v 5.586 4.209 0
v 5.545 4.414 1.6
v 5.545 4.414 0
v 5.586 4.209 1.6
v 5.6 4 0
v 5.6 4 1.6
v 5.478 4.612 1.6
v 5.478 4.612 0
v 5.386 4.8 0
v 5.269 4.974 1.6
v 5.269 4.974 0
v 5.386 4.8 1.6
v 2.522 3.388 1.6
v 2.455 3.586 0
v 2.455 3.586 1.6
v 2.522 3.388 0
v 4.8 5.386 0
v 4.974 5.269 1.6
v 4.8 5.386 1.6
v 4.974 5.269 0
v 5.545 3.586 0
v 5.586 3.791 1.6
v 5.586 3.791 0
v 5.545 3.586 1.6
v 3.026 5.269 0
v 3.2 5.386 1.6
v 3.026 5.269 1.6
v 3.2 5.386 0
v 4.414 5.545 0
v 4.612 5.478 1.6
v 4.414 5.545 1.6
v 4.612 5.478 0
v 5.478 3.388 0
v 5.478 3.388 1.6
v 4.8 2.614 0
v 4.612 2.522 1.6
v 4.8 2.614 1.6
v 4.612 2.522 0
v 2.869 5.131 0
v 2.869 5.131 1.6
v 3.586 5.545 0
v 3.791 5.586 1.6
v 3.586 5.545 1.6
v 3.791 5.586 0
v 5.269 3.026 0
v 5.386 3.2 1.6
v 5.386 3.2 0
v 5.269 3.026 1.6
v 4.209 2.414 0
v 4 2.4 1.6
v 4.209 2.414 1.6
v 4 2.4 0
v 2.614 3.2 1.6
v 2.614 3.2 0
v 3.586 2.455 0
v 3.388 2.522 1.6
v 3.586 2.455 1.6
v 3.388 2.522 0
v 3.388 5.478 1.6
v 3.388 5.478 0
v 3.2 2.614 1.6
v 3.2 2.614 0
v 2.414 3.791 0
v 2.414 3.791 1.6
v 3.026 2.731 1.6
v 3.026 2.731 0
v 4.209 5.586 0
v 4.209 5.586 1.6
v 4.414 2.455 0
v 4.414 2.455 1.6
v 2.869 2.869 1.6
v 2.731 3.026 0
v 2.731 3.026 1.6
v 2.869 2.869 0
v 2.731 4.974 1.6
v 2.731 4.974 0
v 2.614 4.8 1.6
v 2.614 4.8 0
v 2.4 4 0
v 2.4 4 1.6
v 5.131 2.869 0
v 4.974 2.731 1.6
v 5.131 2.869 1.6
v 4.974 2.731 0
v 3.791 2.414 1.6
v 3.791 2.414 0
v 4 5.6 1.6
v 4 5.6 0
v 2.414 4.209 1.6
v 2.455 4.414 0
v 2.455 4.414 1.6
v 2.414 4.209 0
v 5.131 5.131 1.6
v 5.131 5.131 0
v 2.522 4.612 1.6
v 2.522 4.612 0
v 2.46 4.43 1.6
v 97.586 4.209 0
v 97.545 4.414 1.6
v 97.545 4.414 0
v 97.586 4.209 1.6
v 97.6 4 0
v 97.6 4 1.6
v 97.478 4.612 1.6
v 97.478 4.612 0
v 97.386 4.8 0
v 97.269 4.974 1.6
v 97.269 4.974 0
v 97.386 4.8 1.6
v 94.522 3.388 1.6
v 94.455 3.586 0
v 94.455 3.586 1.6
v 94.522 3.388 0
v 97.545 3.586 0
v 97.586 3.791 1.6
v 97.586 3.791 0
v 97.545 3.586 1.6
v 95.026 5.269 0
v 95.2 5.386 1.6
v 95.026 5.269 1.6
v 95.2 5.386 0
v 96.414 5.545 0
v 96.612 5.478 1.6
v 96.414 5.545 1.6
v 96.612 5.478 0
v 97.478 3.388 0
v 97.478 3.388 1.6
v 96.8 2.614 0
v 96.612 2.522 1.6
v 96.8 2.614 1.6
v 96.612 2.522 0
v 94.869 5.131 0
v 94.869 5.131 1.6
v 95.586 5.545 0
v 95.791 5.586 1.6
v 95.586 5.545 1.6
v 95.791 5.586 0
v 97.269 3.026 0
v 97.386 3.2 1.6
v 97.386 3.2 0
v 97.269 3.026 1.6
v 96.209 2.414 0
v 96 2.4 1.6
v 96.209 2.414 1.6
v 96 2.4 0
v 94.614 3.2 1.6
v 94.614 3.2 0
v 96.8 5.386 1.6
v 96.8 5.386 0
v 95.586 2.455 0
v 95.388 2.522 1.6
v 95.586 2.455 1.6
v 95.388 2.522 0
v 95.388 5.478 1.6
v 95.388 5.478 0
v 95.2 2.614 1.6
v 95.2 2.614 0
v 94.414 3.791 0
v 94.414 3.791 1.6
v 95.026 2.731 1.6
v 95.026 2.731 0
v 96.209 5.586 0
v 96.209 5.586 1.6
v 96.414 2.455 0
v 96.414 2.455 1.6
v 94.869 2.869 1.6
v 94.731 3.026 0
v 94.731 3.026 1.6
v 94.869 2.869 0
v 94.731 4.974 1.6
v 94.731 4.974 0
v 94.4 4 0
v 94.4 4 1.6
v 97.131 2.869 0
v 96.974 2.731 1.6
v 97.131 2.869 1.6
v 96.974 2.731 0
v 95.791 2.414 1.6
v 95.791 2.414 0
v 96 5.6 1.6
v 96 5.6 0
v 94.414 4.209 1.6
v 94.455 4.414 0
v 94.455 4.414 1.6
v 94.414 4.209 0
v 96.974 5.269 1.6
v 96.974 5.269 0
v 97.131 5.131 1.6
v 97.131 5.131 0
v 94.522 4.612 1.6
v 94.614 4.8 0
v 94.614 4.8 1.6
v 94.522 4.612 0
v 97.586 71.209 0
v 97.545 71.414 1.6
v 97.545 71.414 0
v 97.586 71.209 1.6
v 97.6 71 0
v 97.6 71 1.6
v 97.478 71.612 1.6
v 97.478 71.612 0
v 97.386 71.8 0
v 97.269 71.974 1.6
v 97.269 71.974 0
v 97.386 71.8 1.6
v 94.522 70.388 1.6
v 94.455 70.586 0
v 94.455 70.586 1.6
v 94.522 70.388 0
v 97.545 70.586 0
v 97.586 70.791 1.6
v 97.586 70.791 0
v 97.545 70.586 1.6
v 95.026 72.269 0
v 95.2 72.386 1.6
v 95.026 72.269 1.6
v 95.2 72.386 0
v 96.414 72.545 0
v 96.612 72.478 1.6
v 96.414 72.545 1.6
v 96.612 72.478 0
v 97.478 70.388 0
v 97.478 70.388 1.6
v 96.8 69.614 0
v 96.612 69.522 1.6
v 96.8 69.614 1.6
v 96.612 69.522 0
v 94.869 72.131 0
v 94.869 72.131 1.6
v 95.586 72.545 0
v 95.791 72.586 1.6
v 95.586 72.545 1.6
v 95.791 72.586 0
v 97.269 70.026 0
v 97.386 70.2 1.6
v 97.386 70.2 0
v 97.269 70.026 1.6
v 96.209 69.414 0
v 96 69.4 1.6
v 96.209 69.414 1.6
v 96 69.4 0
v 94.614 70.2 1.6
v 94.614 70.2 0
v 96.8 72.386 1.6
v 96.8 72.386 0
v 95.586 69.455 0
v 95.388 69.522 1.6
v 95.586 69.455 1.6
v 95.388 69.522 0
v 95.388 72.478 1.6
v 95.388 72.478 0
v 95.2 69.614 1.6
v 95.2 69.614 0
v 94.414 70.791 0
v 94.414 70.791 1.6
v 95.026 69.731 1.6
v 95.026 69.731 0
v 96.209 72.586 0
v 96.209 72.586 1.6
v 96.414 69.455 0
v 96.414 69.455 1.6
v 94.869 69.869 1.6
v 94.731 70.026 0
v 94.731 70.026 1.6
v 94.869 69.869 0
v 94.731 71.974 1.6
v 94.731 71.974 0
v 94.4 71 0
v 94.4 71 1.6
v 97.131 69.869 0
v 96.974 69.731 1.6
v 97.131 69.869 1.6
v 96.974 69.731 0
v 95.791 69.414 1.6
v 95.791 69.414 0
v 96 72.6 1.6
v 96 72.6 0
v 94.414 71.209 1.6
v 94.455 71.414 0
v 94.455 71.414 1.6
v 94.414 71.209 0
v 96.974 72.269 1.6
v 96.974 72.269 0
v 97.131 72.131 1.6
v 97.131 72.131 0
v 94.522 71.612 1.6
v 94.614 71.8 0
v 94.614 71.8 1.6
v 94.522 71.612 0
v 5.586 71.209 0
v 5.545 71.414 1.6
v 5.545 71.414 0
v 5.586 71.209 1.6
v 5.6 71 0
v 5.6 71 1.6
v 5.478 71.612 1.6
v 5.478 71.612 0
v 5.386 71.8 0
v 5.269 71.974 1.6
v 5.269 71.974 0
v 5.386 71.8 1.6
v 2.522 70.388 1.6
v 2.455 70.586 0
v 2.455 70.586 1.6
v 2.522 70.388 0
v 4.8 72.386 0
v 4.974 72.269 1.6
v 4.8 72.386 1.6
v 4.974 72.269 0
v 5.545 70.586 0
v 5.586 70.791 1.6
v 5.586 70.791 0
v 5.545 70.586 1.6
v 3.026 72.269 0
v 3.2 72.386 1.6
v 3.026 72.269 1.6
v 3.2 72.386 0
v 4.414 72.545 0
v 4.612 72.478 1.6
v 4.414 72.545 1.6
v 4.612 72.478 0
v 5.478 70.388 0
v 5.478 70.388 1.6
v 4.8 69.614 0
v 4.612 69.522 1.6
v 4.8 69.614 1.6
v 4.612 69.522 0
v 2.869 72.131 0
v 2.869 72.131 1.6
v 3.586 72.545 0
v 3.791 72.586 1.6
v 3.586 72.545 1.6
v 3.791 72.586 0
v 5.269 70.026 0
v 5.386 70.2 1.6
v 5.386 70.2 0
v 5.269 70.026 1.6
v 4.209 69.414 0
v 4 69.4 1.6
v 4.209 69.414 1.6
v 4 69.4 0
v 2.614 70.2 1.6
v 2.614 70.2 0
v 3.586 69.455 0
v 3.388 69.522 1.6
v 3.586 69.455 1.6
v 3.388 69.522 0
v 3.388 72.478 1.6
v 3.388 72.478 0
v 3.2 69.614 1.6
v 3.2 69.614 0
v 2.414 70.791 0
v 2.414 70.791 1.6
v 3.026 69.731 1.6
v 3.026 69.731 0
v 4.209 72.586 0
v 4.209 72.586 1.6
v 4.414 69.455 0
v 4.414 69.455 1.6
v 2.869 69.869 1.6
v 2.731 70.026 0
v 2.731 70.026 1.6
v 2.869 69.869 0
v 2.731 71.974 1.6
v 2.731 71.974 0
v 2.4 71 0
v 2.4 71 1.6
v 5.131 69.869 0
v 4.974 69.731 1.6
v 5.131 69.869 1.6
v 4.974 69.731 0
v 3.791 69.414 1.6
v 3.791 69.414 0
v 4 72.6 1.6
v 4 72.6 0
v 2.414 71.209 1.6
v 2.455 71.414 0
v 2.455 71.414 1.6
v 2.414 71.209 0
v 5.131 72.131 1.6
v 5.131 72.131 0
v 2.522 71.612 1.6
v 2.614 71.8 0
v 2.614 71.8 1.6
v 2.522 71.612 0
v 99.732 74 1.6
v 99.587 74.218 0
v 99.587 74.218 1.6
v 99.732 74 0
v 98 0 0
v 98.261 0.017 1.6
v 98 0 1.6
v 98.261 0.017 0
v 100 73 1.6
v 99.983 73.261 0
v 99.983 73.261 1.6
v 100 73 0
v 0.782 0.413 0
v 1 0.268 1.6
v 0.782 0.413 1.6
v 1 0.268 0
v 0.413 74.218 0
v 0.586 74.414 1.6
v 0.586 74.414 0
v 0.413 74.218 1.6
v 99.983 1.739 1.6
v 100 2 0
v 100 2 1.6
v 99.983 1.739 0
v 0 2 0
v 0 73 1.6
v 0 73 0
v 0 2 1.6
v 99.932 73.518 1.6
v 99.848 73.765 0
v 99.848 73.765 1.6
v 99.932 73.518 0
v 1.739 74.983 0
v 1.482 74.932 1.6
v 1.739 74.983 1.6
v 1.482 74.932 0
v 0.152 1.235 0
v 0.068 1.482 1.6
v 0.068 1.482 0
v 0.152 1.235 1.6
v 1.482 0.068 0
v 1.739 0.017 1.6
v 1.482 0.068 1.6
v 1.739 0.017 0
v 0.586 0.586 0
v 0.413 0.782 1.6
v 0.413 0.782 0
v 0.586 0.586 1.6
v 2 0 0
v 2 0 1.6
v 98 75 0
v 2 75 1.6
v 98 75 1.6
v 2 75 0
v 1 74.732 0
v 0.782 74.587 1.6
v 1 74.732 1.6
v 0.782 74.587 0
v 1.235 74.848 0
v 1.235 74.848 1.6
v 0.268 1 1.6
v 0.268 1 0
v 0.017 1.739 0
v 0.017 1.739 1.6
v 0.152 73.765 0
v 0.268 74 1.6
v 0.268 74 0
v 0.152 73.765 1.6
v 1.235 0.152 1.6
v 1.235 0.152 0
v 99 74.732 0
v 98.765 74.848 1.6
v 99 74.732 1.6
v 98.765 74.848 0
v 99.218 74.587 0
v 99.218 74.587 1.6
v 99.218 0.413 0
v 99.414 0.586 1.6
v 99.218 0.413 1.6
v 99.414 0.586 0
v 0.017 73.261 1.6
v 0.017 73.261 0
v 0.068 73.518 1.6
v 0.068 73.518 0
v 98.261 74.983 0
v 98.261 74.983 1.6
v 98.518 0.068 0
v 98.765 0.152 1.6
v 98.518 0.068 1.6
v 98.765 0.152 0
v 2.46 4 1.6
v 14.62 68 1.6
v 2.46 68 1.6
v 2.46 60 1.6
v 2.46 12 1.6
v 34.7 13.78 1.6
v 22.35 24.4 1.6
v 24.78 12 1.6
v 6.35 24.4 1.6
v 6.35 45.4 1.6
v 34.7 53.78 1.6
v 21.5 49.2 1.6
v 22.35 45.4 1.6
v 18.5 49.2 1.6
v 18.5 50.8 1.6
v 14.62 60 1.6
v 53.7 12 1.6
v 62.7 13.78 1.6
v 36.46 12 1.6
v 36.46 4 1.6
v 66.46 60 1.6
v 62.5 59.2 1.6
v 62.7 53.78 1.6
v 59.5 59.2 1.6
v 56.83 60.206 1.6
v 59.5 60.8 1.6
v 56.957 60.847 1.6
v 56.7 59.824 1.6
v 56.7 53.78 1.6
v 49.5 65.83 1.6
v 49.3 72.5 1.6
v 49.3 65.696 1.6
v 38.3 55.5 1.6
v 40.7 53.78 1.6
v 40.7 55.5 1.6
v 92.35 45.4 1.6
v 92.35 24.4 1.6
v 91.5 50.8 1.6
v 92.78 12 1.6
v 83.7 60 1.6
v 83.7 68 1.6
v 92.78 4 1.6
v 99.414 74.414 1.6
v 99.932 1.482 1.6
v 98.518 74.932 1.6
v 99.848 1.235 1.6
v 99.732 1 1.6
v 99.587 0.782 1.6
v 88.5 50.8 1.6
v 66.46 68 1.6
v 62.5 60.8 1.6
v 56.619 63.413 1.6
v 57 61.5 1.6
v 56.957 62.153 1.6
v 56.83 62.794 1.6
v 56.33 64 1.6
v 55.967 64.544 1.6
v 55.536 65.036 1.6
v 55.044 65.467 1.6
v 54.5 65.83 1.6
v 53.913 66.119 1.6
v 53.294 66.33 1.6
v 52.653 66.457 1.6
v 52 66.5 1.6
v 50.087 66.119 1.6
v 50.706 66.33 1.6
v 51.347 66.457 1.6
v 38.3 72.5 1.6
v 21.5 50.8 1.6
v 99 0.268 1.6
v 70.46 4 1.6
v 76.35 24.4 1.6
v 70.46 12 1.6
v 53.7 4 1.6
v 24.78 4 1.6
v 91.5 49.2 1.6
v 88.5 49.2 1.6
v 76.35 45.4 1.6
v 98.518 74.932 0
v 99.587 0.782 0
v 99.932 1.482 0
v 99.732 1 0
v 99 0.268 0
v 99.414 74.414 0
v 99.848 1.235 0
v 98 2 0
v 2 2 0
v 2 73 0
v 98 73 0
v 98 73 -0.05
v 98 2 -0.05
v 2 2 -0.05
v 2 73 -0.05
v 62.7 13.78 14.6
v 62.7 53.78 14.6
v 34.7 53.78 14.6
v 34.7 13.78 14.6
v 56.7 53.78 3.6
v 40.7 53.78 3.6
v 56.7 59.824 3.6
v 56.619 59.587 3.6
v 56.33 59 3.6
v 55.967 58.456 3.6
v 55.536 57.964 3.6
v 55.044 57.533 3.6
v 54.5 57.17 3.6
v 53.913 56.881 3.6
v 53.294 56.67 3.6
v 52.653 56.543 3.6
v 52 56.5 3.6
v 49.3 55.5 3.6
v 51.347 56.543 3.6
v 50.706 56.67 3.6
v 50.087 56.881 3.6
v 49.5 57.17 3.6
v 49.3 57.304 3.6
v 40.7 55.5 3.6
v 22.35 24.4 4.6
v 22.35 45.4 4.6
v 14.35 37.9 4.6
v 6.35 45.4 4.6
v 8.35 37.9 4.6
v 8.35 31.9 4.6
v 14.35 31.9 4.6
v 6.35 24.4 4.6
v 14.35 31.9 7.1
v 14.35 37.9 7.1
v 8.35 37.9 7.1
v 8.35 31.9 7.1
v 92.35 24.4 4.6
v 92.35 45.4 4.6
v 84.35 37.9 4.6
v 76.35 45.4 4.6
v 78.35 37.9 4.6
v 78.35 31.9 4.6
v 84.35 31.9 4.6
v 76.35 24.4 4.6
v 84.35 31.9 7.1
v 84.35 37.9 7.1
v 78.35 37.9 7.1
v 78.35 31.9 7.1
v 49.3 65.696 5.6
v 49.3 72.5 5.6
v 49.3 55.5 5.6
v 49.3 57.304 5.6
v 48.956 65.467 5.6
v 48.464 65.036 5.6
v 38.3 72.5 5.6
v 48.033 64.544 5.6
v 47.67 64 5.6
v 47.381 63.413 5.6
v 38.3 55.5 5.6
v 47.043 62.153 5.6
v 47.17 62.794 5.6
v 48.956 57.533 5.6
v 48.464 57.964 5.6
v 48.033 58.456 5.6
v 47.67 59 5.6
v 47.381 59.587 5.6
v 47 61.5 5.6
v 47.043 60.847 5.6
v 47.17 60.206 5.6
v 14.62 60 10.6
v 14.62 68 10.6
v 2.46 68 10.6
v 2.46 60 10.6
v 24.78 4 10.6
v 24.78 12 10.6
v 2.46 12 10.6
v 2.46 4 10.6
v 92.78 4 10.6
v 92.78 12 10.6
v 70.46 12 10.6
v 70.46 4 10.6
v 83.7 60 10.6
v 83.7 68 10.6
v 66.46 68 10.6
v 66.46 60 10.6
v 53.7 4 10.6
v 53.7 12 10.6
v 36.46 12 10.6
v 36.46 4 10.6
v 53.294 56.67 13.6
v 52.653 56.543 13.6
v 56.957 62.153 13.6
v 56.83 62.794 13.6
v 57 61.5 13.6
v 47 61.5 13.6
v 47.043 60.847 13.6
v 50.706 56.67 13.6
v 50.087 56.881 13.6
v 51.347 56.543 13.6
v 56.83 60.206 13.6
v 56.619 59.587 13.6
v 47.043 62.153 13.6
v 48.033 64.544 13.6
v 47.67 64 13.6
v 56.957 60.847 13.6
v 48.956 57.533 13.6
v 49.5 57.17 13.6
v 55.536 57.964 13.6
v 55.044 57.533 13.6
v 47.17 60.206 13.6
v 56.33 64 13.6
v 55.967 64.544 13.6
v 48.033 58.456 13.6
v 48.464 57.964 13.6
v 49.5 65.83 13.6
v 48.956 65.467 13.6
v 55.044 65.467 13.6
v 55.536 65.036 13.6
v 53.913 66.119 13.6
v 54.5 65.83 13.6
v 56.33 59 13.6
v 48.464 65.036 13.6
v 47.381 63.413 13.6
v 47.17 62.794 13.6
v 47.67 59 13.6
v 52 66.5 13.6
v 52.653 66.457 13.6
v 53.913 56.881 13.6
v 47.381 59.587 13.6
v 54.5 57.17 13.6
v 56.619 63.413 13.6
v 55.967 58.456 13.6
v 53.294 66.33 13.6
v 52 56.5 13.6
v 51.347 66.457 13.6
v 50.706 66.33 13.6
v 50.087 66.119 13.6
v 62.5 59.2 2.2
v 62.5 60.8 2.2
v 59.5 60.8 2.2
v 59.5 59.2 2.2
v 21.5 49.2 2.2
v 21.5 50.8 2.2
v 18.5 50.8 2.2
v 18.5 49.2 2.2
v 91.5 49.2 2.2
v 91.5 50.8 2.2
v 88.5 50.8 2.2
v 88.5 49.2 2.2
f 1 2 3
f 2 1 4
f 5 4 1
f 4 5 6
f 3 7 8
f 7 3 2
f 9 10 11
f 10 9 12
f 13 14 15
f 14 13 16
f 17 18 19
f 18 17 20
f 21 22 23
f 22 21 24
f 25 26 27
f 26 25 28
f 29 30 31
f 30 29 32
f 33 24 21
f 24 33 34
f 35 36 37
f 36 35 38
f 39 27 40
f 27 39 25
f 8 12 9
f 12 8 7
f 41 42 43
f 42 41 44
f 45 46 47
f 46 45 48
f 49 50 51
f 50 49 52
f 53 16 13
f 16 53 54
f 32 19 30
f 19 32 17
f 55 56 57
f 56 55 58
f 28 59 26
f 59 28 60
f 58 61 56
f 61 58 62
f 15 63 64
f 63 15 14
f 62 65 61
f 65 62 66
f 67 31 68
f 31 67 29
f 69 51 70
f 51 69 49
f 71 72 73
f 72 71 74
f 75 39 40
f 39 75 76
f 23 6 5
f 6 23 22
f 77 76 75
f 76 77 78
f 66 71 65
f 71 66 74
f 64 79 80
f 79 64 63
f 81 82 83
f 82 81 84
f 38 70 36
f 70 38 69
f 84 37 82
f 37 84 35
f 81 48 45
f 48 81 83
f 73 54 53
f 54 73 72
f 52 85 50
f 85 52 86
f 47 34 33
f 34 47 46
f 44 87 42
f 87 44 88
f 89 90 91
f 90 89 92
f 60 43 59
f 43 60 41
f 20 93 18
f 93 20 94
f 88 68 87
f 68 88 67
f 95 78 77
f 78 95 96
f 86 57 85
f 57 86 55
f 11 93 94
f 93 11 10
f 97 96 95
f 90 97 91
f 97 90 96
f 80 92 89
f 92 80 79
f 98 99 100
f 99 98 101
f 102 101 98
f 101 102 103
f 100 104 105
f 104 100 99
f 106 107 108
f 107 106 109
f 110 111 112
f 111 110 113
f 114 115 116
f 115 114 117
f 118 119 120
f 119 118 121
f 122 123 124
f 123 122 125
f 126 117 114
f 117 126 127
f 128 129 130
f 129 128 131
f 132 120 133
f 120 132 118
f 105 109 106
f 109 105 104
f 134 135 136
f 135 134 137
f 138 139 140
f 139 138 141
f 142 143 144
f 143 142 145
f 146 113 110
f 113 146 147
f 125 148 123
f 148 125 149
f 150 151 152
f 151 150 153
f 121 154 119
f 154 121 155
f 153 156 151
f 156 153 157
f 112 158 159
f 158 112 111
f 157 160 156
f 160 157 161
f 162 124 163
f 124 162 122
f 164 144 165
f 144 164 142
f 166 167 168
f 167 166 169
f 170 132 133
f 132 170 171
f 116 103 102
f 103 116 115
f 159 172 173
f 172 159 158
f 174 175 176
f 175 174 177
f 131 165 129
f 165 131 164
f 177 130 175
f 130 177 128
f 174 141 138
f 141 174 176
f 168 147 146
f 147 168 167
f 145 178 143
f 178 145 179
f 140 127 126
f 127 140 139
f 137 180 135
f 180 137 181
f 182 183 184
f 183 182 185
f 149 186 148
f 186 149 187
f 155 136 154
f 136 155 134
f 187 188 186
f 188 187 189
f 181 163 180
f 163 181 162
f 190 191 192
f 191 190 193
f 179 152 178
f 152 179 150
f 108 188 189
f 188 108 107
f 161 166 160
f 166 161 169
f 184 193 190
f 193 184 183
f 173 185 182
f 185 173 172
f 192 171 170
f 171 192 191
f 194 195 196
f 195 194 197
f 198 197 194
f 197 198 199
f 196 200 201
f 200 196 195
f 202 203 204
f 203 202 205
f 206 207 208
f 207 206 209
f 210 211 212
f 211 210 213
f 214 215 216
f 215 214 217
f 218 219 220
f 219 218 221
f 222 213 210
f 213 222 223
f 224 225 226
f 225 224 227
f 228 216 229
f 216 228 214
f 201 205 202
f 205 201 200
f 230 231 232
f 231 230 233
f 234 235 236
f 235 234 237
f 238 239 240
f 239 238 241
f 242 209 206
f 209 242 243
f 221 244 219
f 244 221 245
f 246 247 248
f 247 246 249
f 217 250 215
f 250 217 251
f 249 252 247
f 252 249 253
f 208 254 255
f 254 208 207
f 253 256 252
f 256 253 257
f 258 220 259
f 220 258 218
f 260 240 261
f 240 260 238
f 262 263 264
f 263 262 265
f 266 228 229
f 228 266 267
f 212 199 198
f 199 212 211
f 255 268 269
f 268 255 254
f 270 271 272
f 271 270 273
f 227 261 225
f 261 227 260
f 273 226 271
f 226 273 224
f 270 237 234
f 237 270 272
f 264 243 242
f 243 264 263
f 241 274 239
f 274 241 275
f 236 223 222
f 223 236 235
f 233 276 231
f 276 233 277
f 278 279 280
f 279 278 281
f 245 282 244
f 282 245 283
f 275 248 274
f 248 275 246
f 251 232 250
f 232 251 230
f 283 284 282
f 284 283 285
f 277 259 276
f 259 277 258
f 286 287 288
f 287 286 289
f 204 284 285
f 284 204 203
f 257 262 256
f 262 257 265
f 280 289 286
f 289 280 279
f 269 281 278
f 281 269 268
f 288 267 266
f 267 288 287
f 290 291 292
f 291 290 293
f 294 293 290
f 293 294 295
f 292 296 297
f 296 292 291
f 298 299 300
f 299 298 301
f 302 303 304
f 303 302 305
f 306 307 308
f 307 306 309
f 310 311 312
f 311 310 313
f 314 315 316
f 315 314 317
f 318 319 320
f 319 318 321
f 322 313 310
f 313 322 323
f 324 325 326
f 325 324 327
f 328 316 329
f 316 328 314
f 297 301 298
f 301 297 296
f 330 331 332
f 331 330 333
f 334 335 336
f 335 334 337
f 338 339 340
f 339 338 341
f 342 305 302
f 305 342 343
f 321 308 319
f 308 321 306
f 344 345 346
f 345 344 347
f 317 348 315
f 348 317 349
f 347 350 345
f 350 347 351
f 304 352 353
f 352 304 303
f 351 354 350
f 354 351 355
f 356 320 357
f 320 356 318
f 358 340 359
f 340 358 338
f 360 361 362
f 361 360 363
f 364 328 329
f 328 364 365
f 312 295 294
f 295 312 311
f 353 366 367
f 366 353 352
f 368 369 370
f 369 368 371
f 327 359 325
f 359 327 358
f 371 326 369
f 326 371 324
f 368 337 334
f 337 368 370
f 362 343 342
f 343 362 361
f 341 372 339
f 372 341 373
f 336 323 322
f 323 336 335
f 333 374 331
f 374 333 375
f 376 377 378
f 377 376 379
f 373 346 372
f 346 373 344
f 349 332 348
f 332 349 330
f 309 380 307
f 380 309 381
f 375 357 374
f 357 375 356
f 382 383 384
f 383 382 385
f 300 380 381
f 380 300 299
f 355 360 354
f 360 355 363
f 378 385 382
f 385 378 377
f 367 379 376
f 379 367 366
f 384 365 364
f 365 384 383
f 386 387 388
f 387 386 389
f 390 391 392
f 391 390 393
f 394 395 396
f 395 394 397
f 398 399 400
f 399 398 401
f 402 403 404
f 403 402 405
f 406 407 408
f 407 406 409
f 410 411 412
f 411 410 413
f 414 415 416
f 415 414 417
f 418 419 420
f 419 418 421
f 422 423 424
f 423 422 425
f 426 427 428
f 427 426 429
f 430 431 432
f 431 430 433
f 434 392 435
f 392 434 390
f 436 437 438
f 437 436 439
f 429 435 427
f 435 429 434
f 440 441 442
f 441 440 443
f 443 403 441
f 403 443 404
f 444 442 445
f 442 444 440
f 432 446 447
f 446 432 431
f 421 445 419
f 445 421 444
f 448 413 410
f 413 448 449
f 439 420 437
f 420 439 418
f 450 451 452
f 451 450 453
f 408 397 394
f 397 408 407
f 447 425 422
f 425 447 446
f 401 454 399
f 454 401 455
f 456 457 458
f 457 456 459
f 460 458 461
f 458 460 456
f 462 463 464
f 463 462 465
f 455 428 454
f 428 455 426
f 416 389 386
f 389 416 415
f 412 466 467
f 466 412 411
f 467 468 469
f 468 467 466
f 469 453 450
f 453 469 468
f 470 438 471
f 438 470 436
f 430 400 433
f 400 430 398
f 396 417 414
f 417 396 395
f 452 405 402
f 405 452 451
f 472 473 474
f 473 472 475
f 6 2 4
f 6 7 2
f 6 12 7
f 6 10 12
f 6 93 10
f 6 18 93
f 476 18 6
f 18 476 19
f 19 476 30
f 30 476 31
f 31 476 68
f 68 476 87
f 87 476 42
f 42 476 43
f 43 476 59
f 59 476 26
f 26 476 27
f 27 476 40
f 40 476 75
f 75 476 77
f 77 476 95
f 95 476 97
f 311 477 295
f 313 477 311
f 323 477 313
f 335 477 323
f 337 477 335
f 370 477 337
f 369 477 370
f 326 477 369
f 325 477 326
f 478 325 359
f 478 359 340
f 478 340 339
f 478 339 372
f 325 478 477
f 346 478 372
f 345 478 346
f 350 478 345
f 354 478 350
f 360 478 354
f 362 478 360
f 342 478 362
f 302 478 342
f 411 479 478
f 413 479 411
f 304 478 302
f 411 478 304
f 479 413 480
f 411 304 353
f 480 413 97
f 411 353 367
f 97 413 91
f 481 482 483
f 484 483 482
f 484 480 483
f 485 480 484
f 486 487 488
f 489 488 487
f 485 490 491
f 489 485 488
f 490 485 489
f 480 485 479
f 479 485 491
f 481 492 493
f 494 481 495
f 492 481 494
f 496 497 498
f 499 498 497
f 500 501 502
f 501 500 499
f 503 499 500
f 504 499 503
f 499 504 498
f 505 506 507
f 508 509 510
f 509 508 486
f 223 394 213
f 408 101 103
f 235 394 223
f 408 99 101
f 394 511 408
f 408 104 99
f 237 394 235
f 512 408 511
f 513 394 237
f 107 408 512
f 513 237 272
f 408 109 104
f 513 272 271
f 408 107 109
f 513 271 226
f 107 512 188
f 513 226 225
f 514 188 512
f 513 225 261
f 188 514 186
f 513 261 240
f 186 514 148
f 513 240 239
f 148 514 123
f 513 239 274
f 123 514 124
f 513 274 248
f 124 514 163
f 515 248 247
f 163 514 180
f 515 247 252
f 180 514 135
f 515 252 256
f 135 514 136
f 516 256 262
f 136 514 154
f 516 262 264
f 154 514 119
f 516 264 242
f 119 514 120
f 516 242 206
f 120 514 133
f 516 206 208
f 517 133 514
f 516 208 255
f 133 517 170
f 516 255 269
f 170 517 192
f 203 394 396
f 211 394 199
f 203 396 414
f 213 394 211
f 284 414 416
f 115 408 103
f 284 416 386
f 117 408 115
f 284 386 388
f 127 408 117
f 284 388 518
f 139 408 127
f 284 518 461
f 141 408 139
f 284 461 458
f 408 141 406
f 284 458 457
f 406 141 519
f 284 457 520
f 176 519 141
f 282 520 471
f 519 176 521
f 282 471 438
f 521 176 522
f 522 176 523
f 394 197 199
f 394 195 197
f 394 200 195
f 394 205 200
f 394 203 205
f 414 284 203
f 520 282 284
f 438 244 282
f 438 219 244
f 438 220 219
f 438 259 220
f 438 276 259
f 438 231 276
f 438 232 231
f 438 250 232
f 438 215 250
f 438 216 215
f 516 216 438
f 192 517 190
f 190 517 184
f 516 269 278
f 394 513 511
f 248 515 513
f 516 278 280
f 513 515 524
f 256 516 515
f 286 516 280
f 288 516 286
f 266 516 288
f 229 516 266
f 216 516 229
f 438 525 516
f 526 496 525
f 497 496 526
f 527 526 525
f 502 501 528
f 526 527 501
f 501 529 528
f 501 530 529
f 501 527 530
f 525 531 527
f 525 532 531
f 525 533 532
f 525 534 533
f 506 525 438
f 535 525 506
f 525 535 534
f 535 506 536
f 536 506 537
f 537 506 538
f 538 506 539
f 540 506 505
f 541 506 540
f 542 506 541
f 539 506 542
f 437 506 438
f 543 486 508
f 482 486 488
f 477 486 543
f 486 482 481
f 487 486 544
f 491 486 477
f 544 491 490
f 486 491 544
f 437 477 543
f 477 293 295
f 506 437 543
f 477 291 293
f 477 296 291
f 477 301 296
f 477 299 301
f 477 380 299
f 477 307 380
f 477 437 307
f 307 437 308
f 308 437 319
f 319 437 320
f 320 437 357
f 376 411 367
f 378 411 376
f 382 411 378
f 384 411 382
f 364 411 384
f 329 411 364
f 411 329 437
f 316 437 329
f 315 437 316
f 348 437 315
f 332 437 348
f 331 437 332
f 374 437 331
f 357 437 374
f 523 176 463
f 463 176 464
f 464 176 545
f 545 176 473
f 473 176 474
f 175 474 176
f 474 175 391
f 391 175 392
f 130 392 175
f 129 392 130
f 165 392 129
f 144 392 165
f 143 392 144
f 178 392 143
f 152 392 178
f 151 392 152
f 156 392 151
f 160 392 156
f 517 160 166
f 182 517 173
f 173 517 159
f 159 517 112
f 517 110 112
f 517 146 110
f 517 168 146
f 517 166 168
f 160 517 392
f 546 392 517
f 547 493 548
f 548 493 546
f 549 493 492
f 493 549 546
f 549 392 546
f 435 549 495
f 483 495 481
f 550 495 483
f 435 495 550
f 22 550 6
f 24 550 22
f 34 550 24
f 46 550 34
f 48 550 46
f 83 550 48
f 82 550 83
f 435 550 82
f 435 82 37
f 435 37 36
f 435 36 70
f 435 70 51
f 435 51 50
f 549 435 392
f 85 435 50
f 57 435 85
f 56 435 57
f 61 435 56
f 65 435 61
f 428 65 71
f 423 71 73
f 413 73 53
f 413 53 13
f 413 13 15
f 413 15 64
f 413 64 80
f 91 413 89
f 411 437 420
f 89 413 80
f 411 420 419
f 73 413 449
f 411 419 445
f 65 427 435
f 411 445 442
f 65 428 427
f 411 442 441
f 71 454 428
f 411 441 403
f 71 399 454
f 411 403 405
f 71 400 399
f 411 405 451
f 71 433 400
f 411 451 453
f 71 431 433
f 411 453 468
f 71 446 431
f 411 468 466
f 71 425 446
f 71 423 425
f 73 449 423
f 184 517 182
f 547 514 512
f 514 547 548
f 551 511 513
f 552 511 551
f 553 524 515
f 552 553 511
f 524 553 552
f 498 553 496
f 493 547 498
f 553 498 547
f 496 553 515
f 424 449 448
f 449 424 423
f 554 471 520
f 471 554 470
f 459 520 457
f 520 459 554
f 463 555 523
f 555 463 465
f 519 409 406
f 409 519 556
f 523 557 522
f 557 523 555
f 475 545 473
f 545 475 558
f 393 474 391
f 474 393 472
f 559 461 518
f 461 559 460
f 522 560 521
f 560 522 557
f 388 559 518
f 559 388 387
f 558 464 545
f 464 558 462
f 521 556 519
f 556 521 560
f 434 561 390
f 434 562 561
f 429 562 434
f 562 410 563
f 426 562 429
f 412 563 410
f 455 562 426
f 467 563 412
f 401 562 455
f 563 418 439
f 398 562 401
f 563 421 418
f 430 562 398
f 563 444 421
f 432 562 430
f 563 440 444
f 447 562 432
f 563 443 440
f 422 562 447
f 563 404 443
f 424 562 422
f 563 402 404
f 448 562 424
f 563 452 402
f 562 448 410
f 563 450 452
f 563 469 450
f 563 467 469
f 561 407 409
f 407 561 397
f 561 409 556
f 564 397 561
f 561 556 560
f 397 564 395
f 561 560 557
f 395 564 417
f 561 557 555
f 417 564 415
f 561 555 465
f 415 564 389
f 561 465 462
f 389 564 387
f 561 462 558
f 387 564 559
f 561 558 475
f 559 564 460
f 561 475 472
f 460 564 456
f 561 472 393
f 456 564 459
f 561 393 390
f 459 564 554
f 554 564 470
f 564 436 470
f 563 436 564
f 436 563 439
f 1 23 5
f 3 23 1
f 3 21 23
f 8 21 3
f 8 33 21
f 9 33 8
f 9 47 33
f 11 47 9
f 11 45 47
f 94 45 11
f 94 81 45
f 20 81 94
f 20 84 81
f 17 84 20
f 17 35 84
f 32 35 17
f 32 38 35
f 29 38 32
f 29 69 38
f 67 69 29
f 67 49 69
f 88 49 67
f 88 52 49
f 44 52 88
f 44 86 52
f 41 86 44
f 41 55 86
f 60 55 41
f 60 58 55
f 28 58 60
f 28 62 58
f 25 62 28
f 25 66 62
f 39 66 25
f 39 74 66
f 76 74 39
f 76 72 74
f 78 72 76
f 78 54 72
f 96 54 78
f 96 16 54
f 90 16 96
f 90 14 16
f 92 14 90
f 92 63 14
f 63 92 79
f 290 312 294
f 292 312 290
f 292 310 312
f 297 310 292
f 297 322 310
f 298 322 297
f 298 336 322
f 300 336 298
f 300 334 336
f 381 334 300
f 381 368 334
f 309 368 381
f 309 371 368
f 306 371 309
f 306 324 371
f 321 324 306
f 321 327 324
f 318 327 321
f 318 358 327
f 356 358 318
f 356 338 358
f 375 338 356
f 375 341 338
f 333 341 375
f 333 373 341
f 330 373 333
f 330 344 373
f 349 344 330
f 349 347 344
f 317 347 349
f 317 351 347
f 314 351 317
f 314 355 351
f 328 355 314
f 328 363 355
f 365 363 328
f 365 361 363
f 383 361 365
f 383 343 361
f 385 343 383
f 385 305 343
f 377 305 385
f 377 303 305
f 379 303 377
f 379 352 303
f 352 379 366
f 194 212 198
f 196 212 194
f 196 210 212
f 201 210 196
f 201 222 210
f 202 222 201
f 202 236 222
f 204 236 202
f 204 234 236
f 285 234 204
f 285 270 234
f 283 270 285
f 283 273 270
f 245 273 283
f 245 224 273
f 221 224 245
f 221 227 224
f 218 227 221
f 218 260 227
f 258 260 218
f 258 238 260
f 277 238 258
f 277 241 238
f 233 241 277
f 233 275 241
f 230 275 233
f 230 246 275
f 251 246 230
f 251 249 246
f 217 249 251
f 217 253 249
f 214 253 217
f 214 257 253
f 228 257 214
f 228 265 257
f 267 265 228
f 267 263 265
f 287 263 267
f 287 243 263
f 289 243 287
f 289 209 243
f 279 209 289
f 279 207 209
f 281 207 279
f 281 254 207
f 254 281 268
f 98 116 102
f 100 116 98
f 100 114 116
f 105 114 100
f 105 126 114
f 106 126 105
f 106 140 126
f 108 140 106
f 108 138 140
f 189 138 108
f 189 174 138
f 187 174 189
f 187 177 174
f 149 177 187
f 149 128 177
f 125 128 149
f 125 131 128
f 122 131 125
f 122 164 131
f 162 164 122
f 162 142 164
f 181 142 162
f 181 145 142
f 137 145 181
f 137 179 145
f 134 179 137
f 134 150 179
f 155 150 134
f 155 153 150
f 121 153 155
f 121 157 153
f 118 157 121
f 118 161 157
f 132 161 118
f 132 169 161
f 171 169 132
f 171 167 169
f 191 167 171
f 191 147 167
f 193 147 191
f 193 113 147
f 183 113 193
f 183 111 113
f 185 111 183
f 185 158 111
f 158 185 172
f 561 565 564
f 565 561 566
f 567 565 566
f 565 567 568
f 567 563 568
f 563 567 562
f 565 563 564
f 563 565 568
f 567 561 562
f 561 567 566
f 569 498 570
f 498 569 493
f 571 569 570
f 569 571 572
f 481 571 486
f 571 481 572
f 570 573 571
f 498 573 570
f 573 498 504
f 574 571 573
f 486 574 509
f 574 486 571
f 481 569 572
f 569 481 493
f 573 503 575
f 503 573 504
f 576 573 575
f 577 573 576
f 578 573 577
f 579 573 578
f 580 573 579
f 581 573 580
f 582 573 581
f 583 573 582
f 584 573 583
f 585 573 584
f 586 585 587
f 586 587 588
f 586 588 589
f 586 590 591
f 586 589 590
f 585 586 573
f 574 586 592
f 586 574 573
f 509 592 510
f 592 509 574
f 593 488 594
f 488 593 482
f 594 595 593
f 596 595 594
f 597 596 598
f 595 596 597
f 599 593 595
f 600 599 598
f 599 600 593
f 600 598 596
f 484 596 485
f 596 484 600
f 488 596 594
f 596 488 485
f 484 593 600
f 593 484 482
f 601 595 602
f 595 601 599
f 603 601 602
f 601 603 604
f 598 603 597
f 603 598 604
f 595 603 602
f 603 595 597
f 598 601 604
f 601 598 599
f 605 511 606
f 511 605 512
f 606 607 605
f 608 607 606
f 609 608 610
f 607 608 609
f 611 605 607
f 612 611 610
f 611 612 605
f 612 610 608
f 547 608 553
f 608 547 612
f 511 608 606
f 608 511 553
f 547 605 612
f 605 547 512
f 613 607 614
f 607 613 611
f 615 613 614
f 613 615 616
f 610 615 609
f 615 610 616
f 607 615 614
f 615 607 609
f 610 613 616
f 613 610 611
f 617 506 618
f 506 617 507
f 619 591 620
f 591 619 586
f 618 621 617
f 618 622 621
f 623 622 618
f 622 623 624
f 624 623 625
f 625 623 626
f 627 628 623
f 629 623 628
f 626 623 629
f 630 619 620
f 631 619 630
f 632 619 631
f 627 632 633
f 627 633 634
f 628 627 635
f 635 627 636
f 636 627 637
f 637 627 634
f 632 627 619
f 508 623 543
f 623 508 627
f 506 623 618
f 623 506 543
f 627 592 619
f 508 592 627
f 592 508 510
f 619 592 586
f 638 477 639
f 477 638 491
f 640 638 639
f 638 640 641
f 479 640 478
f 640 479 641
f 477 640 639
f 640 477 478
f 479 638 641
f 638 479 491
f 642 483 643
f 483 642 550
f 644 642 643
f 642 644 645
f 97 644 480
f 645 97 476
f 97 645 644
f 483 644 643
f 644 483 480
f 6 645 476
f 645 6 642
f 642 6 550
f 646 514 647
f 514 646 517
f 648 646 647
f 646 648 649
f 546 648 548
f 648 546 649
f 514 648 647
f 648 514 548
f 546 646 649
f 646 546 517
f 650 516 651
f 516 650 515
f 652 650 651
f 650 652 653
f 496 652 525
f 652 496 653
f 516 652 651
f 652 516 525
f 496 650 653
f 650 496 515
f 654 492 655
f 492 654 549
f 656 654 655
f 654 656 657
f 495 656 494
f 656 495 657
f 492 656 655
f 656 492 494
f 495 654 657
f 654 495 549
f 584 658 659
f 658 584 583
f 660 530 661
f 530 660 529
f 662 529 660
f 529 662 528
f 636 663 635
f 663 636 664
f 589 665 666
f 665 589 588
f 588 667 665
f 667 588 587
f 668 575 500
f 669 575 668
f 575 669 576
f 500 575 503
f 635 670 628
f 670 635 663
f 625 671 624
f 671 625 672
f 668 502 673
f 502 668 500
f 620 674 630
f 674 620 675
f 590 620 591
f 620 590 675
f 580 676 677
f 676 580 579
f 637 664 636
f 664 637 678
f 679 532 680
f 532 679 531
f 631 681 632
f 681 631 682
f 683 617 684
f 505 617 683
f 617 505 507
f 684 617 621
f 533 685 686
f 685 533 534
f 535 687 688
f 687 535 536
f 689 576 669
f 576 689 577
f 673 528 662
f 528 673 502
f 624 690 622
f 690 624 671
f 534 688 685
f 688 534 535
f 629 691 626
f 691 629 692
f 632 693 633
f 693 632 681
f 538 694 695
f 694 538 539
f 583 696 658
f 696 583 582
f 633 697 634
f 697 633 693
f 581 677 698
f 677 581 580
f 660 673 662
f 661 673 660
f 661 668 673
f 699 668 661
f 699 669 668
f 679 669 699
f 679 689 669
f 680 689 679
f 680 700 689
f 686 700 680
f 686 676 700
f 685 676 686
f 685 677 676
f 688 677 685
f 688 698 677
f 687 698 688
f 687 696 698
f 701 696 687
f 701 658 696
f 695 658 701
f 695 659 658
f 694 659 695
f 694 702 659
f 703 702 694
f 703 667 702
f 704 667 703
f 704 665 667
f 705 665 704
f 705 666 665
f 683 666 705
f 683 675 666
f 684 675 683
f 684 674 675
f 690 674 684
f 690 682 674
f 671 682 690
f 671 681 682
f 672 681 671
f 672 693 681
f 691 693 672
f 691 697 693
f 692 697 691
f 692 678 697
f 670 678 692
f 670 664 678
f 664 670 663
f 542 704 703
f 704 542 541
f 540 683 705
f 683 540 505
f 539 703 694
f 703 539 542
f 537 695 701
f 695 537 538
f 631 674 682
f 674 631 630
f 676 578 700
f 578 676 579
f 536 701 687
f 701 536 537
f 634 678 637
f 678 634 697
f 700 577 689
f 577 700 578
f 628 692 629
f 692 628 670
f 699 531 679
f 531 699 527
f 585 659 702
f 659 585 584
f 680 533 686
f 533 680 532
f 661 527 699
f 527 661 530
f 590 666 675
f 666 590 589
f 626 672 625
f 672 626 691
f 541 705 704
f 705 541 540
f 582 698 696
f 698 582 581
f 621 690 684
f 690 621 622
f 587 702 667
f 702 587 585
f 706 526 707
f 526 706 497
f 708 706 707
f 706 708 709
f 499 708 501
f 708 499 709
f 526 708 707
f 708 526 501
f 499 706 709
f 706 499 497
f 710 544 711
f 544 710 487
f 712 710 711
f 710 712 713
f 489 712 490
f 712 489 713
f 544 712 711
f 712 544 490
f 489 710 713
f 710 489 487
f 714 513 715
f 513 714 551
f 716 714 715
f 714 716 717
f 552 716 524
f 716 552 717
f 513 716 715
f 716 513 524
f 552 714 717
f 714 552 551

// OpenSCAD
// ============================================================================
//  Kontrol Karti - 3D dizgi modeli (populated PCB)
//  pcb_gen.py ile ayni yerlesim. OpenSCAD'de Render (F6) -> Export STL.
//  Birim: mm
// ============================================================================
BW = 100; BH = 75; TH = 1.6;        // kart olculeri (pcb_gen.py ile ayni)
$fn = 48;

module pcb() {
    color([0.05,0.35,0.12]) difference() {              // FR4 yesil
        linear_extrude(TH) offset(r=2) offset(r=-2)
            square([BW,BH]);
        for (p=[[4,4],[BW-4,4],[BW-4,BH-4],[4,BH-4]])
            translate([p[0],p[1],-1]) cylinder(d=3.2,h=TH+2);
    }
    // bakir alt GND plane ipucu (ince katman)
    color([0.72,0.45,0.2]) translate([2,2,-0.05]) cube([BW-4,BH-4,0.05]);
}

// --- jenerik dik pin header / modul govdesi ---
module block(x,y,w,d,h,col) translate([x-w/2,y-d/2,TH]) color(col) cube([w,d,h]);
module pinrow(x,y,n,pitch=2.54,horiz=true)
    for(i=[0:n-1]) translate(horiz?[x+i*pitch,y,TH]:[x,y+i*pitch,TH])
        color([0.85,0.75,0.2]) cylinder(d=0.6,h=4);

module esp32()    { block(36+12.7,16+15*2.54/2-1.27, 28,40, 13,[0.1,0.1,0.12]);
                    color([0.8,0.8,0.85]) block(36+12.7,16+38, 16,18,2,[0.8,0.8,0.85]); } // anten
module stepstick(x,y,c){ block(x+6.35,y+8.9, 16,21, 3,[0.15,0.15,0.15]);
                    color([0.6,0.6,0.65]) translate([x+6.35-3,y+8.9,TH+3]) cube([6,6,5],center=true); } // surucu IC + heatsink
module buck(x,y)  block(x+3.8,y, 11,17,4,[0.05,0.05,0.4]);
module term(x,y,n){ block(x+(n-1)*5.08/2,y, n*5.08+2,8,9,[0.1,0.25,0.6]); }  // mavi vidali klemens
module ecap(x,y)  translate([x,y,TH]) color([0.1,0.1,0.12]) cylinder(d=10,h=12);
module smd(x,y)   block(x,y,3,1.6,0.6,[0.1,0.1,0.1]);

module assembly() {
    pcb();
    esp32();
    stepstick(8,26,"th"); stepstick(78,26,"rh");
    buck(40,64);
    term(6,64,2);                 // J1 12V
    term(6,8,4); term(74,8,4);    // J2/J3 motor
    term(70,64,3);                // J4 LED
    term(40,8,3);                 // J5 endstop
    ecap(52,61.5);                // C1
    smd(61,60);                   // R1
    smd(20,50); smd(90,50);       // C2,C3
}
assembly();
